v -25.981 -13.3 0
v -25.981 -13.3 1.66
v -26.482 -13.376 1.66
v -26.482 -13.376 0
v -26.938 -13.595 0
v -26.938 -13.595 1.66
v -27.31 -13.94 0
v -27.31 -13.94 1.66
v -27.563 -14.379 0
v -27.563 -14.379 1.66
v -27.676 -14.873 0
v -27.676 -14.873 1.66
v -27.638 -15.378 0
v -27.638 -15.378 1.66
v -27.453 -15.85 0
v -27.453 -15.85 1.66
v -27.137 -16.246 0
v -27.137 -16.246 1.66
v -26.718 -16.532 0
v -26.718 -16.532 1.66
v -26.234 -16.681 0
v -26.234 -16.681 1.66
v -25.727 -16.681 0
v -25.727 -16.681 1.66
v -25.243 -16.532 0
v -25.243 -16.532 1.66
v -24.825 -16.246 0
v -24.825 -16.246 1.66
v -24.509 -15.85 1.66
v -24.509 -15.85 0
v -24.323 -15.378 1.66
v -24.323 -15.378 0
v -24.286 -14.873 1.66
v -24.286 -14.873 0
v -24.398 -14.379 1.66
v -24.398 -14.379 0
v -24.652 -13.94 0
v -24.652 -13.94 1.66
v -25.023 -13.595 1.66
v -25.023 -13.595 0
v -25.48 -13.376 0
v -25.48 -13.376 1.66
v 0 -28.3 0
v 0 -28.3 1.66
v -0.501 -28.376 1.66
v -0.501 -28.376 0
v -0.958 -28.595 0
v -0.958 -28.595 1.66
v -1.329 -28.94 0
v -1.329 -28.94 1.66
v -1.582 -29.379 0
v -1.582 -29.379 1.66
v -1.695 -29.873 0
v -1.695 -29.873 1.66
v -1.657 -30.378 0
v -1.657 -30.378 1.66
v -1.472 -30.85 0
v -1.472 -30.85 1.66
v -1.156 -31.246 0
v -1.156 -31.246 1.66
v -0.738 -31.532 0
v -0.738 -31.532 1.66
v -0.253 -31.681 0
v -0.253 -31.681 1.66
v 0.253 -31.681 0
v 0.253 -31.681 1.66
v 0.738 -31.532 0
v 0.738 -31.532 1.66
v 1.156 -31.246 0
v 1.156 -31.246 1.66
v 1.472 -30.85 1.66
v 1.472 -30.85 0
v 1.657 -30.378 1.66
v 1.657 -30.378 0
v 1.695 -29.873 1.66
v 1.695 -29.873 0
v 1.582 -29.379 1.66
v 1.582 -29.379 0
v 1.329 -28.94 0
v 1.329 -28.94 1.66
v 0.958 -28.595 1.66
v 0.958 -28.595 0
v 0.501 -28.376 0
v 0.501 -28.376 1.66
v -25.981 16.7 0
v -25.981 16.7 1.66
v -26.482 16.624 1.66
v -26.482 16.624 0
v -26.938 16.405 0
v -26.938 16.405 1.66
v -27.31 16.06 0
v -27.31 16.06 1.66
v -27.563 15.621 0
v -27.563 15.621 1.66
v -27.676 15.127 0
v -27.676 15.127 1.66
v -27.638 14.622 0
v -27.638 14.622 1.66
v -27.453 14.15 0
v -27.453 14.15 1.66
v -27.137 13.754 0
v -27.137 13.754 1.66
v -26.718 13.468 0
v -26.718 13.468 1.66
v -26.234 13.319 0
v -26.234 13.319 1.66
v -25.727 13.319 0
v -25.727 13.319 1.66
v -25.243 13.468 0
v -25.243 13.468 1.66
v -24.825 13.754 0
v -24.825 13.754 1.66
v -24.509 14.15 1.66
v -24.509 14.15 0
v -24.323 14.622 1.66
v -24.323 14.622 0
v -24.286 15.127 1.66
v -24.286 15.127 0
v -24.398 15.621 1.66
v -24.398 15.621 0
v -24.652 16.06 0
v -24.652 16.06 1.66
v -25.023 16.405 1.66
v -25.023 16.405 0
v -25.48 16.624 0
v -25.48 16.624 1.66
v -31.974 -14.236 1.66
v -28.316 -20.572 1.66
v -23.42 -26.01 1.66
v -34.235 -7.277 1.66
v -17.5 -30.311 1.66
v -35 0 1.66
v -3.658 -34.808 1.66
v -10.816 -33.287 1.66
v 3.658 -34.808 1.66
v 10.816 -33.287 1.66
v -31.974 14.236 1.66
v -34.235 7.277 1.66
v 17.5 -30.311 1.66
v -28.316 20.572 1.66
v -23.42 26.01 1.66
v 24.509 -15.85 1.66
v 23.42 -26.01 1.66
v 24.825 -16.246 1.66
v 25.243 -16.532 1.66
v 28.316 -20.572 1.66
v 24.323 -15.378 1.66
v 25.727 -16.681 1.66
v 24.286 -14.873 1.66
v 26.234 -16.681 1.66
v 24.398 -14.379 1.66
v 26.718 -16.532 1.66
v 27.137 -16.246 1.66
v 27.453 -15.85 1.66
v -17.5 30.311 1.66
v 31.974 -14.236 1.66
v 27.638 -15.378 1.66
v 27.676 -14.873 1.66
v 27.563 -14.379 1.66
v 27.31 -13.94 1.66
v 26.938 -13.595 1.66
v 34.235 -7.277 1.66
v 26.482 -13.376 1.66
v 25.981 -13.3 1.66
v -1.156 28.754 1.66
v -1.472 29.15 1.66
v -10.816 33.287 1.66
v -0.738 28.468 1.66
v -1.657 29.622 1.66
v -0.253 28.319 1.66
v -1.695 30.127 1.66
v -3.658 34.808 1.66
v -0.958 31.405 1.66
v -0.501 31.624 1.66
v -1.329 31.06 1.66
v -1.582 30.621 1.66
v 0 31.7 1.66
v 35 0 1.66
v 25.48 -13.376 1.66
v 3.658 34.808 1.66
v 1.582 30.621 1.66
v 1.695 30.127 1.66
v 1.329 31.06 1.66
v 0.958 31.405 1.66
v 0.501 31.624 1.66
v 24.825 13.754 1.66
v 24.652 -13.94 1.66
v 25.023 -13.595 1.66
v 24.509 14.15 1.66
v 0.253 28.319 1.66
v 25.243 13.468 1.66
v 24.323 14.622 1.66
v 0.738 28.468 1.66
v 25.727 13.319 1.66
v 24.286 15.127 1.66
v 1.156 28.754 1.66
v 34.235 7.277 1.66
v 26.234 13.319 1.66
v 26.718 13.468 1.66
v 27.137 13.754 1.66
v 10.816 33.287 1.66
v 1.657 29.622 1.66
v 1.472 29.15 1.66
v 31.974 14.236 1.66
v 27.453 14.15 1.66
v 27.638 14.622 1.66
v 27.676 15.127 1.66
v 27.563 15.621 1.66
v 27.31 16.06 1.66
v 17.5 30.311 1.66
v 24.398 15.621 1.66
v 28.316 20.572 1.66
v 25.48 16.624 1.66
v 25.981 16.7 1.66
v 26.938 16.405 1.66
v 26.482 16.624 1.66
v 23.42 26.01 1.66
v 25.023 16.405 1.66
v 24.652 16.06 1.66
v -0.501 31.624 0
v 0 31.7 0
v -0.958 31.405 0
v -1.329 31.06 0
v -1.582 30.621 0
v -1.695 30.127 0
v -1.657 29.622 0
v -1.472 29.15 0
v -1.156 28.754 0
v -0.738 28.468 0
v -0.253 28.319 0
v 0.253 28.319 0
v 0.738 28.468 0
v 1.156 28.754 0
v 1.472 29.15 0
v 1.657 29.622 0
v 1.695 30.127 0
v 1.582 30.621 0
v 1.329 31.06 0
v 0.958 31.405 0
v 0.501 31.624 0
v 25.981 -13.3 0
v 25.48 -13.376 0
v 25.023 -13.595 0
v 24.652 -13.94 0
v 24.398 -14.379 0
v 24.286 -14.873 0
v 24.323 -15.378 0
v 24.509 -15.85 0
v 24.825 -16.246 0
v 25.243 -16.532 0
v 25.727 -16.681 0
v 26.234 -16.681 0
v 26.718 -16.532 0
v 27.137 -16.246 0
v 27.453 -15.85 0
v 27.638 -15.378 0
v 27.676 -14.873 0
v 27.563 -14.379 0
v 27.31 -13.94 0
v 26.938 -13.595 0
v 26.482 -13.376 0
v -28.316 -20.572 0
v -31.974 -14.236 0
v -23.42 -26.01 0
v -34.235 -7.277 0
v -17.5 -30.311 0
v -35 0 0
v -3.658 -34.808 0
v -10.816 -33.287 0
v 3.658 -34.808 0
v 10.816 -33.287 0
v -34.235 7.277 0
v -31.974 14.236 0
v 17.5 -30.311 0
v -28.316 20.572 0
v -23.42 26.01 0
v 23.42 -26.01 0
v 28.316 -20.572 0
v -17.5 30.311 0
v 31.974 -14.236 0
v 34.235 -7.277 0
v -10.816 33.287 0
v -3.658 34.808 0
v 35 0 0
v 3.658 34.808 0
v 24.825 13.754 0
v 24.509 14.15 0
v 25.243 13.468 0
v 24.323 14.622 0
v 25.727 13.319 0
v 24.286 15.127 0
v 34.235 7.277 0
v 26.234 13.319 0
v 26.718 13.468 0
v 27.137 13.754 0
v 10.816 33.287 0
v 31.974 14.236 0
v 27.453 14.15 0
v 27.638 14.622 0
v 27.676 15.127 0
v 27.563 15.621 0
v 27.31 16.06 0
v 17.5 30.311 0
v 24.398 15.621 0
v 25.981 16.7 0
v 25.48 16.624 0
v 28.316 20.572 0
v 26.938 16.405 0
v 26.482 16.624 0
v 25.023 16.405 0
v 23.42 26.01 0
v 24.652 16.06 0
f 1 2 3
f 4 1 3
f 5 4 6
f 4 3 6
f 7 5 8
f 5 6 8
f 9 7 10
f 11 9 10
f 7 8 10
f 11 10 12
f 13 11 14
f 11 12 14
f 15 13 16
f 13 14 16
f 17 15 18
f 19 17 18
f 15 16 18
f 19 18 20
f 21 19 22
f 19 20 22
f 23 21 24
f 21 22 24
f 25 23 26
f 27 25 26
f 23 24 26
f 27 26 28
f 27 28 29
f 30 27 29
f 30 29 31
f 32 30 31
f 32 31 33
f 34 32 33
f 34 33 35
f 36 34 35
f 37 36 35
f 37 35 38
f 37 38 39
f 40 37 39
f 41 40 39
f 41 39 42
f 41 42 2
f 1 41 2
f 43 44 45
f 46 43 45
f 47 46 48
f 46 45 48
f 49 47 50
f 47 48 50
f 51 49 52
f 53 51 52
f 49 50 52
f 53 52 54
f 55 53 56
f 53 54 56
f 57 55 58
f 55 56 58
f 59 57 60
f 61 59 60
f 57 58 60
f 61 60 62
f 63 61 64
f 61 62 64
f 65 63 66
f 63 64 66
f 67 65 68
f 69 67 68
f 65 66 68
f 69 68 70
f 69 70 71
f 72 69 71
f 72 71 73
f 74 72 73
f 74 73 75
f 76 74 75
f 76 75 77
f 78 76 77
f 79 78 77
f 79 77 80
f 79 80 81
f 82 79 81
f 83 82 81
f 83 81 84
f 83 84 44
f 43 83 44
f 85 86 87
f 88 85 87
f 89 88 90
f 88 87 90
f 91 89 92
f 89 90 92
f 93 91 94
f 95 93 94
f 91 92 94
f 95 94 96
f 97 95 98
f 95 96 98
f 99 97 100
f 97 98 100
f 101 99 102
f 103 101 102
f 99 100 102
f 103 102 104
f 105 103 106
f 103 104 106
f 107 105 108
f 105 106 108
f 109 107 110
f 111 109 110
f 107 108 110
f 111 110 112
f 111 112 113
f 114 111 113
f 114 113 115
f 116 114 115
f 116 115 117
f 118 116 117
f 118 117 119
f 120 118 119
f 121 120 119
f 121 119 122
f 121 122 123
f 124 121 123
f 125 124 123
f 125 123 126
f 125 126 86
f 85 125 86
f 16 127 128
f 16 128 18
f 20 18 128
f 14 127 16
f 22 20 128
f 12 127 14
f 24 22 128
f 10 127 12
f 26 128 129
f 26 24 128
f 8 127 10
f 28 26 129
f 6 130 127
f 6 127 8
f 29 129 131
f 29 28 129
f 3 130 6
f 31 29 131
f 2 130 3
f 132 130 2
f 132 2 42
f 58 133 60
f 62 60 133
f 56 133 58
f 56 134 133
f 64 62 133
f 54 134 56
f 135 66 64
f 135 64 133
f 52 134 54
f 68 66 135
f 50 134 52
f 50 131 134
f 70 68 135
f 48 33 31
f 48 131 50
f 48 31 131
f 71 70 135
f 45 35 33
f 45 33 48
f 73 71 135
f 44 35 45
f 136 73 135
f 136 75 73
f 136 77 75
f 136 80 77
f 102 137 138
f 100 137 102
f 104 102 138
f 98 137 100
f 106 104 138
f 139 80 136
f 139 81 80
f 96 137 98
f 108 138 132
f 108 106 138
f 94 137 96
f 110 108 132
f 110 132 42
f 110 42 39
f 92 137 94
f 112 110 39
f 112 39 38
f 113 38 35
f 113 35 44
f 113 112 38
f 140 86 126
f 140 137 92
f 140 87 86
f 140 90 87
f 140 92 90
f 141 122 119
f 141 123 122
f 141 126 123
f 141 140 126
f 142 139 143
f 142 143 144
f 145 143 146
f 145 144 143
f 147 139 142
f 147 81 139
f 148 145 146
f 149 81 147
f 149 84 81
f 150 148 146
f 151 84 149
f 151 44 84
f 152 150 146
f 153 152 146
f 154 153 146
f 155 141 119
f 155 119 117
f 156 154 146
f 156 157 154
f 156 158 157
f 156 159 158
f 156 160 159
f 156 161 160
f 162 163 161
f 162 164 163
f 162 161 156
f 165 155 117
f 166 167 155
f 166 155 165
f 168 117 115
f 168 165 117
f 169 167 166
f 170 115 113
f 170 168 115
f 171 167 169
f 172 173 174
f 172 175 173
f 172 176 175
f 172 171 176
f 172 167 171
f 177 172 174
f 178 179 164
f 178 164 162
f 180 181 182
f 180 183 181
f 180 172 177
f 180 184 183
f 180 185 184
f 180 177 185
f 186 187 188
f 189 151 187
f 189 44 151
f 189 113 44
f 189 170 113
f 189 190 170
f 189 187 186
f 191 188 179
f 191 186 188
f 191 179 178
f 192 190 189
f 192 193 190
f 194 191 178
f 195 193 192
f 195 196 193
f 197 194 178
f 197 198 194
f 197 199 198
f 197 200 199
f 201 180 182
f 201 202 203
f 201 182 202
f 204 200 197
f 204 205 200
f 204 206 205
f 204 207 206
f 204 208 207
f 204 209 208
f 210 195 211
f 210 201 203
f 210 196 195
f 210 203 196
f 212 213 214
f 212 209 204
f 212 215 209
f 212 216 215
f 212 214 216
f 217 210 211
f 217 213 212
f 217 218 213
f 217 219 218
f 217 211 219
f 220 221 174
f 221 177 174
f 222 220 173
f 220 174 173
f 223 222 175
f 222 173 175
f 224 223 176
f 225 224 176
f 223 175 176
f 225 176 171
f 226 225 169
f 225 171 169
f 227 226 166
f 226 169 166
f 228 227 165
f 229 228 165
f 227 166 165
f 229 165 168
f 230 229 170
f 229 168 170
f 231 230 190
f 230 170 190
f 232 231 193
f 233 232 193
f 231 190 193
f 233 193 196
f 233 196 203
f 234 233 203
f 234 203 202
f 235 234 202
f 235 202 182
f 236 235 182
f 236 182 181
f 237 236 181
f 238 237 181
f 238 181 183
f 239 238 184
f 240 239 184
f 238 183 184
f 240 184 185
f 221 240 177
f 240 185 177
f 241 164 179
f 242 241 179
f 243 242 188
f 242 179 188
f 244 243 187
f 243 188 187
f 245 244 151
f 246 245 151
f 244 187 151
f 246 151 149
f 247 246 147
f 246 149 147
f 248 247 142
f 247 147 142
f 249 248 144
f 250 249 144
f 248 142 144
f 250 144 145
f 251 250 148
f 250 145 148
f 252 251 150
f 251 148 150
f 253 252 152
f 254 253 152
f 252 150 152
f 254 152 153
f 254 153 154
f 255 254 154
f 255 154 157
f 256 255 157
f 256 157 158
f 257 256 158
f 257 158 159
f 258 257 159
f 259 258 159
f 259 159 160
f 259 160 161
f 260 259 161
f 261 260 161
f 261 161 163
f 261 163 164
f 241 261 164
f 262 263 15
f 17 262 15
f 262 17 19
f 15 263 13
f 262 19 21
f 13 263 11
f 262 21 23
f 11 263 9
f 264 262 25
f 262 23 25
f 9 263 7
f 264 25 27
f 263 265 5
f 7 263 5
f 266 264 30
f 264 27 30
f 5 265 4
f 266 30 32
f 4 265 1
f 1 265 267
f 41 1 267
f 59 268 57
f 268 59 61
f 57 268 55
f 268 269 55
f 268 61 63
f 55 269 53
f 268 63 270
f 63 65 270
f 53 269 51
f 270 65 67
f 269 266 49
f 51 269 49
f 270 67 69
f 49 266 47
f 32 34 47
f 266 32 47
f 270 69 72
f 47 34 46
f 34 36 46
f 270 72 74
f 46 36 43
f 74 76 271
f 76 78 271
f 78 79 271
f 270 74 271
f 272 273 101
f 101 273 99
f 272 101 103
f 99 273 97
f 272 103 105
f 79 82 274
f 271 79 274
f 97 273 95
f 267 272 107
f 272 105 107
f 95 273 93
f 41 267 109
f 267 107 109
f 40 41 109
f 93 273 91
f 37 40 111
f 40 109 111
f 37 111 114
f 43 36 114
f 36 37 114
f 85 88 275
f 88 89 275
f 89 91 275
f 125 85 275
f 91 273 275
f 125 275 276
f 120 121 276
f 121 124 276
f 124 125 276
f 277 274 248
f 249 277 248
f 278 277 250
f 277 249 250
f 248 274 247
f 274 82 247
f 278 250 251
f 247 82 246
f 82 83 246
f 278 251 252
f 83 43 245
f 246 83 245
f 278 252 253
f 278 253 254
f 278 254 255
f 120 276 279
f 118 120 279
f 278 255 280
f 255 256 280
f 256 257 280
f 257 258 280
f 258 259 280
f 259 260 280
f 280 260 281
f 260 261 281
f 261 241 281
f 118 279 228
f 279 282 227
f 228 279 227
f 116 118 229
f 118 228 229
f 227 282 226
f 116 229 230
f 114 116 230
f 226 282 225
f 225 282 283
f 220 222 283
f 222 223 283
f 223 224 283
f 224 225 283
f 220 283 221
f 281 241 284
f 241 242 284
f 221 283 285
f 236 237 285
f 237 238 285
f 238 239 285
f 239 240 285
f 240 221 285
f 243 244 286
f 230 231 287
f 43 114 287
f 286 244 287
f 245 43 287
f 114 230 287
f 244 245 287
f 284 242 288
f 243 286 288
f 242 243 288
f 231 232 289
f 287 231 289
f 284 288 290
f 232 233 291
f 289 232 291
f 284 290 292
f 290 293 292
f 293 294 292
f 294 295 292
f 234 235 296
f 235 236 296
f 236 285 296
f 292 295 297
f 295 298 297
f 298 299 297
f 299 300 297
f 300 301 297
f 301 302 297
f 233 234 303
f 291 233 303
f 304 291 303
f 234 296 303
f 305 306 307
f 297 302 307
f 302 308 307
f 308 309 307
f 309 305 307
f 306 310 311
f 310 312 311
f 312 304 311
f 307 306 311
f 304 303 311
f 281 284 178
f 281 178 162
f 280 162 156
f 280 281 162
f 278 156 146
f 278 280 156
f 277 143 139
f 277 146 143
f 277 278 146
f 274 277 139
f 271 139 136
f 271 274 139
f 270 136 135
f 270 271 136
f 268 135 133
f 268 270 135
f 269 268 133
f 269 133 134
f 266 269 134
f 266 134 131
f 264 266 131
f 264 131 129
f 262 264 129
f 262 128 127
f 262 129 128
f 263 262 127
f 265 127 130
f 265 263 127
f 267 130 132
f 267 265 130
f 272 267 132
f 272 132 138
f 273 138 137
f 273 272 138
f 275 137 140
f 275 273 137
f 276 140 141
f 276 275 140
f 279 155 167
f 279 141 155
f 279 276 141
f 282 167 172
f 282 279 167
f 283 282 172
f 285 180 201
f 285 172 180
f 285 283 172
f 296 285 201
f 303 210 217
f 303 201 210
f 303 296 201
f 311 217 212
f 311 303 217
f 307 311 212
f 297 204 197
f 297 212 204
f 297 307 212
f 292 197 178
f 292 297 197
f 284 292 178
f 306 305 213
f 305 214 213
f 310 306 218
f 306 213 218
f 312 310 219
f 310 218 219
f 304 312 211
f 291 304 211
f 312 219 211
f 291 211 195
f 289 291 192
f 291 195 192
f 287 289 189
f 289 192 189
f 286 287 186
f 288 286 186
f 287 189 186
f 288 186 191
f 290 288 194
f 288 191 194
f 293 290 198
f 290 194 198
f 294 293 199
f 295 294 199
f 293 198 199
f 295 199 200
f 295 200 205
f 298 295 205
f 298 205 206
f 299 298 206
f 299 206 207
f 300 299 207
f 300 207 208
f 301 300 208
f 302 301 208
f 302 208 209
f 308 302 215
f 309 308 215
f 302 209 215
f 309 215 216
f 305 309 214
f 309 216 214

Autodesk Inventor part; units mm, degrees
ref_plane "YZ Plane" through (0, 0, 0) normal (1, 0, 0) x (0, 1, 0)
ref_plane "XZ Plane" through (0, 0, 0) normal (0, 1, 0) x (-1, 0, 0)
ref_plane "XY Plane" through (0, 0, 0) normal (0, 0, 1) x (1, 0, 0)
sketch "Sketch1" plane through (0, 0, 0) normal (0, 0, 1) x (1, 0, 0)
  circle A0 centre (0, 0) radius 35
  point P0 (0, 30)
  point P1 (-25.9808, 15)
  point P2 (-25.9808, -15)
  point P3 (0, -30)
  point P4 (25.9808, -15)
  point P5 (25.9808, 15)
  dimension "d0" = 30
  dimension "d1" = 70
  dimension "d13" = 360
extrude "Extrusion1" add sketch "Sketch1" along normal blind 1.66
hole "Hole1" at (0, 30, 0) at (25.9808, 15, 0) at (0, -30, 0) at (-25.9808, -15, 0) at (-25.9808, 15, 0) at (25.9808, -15, 0) direction (0, 0, 1) diameter 3.4 depth 8 tip angle 118 clearance for "Flat Head Machine Screw" size "M3" standard "Ansi Metric M Profile"
properties part number "capsule.electronics.board"
